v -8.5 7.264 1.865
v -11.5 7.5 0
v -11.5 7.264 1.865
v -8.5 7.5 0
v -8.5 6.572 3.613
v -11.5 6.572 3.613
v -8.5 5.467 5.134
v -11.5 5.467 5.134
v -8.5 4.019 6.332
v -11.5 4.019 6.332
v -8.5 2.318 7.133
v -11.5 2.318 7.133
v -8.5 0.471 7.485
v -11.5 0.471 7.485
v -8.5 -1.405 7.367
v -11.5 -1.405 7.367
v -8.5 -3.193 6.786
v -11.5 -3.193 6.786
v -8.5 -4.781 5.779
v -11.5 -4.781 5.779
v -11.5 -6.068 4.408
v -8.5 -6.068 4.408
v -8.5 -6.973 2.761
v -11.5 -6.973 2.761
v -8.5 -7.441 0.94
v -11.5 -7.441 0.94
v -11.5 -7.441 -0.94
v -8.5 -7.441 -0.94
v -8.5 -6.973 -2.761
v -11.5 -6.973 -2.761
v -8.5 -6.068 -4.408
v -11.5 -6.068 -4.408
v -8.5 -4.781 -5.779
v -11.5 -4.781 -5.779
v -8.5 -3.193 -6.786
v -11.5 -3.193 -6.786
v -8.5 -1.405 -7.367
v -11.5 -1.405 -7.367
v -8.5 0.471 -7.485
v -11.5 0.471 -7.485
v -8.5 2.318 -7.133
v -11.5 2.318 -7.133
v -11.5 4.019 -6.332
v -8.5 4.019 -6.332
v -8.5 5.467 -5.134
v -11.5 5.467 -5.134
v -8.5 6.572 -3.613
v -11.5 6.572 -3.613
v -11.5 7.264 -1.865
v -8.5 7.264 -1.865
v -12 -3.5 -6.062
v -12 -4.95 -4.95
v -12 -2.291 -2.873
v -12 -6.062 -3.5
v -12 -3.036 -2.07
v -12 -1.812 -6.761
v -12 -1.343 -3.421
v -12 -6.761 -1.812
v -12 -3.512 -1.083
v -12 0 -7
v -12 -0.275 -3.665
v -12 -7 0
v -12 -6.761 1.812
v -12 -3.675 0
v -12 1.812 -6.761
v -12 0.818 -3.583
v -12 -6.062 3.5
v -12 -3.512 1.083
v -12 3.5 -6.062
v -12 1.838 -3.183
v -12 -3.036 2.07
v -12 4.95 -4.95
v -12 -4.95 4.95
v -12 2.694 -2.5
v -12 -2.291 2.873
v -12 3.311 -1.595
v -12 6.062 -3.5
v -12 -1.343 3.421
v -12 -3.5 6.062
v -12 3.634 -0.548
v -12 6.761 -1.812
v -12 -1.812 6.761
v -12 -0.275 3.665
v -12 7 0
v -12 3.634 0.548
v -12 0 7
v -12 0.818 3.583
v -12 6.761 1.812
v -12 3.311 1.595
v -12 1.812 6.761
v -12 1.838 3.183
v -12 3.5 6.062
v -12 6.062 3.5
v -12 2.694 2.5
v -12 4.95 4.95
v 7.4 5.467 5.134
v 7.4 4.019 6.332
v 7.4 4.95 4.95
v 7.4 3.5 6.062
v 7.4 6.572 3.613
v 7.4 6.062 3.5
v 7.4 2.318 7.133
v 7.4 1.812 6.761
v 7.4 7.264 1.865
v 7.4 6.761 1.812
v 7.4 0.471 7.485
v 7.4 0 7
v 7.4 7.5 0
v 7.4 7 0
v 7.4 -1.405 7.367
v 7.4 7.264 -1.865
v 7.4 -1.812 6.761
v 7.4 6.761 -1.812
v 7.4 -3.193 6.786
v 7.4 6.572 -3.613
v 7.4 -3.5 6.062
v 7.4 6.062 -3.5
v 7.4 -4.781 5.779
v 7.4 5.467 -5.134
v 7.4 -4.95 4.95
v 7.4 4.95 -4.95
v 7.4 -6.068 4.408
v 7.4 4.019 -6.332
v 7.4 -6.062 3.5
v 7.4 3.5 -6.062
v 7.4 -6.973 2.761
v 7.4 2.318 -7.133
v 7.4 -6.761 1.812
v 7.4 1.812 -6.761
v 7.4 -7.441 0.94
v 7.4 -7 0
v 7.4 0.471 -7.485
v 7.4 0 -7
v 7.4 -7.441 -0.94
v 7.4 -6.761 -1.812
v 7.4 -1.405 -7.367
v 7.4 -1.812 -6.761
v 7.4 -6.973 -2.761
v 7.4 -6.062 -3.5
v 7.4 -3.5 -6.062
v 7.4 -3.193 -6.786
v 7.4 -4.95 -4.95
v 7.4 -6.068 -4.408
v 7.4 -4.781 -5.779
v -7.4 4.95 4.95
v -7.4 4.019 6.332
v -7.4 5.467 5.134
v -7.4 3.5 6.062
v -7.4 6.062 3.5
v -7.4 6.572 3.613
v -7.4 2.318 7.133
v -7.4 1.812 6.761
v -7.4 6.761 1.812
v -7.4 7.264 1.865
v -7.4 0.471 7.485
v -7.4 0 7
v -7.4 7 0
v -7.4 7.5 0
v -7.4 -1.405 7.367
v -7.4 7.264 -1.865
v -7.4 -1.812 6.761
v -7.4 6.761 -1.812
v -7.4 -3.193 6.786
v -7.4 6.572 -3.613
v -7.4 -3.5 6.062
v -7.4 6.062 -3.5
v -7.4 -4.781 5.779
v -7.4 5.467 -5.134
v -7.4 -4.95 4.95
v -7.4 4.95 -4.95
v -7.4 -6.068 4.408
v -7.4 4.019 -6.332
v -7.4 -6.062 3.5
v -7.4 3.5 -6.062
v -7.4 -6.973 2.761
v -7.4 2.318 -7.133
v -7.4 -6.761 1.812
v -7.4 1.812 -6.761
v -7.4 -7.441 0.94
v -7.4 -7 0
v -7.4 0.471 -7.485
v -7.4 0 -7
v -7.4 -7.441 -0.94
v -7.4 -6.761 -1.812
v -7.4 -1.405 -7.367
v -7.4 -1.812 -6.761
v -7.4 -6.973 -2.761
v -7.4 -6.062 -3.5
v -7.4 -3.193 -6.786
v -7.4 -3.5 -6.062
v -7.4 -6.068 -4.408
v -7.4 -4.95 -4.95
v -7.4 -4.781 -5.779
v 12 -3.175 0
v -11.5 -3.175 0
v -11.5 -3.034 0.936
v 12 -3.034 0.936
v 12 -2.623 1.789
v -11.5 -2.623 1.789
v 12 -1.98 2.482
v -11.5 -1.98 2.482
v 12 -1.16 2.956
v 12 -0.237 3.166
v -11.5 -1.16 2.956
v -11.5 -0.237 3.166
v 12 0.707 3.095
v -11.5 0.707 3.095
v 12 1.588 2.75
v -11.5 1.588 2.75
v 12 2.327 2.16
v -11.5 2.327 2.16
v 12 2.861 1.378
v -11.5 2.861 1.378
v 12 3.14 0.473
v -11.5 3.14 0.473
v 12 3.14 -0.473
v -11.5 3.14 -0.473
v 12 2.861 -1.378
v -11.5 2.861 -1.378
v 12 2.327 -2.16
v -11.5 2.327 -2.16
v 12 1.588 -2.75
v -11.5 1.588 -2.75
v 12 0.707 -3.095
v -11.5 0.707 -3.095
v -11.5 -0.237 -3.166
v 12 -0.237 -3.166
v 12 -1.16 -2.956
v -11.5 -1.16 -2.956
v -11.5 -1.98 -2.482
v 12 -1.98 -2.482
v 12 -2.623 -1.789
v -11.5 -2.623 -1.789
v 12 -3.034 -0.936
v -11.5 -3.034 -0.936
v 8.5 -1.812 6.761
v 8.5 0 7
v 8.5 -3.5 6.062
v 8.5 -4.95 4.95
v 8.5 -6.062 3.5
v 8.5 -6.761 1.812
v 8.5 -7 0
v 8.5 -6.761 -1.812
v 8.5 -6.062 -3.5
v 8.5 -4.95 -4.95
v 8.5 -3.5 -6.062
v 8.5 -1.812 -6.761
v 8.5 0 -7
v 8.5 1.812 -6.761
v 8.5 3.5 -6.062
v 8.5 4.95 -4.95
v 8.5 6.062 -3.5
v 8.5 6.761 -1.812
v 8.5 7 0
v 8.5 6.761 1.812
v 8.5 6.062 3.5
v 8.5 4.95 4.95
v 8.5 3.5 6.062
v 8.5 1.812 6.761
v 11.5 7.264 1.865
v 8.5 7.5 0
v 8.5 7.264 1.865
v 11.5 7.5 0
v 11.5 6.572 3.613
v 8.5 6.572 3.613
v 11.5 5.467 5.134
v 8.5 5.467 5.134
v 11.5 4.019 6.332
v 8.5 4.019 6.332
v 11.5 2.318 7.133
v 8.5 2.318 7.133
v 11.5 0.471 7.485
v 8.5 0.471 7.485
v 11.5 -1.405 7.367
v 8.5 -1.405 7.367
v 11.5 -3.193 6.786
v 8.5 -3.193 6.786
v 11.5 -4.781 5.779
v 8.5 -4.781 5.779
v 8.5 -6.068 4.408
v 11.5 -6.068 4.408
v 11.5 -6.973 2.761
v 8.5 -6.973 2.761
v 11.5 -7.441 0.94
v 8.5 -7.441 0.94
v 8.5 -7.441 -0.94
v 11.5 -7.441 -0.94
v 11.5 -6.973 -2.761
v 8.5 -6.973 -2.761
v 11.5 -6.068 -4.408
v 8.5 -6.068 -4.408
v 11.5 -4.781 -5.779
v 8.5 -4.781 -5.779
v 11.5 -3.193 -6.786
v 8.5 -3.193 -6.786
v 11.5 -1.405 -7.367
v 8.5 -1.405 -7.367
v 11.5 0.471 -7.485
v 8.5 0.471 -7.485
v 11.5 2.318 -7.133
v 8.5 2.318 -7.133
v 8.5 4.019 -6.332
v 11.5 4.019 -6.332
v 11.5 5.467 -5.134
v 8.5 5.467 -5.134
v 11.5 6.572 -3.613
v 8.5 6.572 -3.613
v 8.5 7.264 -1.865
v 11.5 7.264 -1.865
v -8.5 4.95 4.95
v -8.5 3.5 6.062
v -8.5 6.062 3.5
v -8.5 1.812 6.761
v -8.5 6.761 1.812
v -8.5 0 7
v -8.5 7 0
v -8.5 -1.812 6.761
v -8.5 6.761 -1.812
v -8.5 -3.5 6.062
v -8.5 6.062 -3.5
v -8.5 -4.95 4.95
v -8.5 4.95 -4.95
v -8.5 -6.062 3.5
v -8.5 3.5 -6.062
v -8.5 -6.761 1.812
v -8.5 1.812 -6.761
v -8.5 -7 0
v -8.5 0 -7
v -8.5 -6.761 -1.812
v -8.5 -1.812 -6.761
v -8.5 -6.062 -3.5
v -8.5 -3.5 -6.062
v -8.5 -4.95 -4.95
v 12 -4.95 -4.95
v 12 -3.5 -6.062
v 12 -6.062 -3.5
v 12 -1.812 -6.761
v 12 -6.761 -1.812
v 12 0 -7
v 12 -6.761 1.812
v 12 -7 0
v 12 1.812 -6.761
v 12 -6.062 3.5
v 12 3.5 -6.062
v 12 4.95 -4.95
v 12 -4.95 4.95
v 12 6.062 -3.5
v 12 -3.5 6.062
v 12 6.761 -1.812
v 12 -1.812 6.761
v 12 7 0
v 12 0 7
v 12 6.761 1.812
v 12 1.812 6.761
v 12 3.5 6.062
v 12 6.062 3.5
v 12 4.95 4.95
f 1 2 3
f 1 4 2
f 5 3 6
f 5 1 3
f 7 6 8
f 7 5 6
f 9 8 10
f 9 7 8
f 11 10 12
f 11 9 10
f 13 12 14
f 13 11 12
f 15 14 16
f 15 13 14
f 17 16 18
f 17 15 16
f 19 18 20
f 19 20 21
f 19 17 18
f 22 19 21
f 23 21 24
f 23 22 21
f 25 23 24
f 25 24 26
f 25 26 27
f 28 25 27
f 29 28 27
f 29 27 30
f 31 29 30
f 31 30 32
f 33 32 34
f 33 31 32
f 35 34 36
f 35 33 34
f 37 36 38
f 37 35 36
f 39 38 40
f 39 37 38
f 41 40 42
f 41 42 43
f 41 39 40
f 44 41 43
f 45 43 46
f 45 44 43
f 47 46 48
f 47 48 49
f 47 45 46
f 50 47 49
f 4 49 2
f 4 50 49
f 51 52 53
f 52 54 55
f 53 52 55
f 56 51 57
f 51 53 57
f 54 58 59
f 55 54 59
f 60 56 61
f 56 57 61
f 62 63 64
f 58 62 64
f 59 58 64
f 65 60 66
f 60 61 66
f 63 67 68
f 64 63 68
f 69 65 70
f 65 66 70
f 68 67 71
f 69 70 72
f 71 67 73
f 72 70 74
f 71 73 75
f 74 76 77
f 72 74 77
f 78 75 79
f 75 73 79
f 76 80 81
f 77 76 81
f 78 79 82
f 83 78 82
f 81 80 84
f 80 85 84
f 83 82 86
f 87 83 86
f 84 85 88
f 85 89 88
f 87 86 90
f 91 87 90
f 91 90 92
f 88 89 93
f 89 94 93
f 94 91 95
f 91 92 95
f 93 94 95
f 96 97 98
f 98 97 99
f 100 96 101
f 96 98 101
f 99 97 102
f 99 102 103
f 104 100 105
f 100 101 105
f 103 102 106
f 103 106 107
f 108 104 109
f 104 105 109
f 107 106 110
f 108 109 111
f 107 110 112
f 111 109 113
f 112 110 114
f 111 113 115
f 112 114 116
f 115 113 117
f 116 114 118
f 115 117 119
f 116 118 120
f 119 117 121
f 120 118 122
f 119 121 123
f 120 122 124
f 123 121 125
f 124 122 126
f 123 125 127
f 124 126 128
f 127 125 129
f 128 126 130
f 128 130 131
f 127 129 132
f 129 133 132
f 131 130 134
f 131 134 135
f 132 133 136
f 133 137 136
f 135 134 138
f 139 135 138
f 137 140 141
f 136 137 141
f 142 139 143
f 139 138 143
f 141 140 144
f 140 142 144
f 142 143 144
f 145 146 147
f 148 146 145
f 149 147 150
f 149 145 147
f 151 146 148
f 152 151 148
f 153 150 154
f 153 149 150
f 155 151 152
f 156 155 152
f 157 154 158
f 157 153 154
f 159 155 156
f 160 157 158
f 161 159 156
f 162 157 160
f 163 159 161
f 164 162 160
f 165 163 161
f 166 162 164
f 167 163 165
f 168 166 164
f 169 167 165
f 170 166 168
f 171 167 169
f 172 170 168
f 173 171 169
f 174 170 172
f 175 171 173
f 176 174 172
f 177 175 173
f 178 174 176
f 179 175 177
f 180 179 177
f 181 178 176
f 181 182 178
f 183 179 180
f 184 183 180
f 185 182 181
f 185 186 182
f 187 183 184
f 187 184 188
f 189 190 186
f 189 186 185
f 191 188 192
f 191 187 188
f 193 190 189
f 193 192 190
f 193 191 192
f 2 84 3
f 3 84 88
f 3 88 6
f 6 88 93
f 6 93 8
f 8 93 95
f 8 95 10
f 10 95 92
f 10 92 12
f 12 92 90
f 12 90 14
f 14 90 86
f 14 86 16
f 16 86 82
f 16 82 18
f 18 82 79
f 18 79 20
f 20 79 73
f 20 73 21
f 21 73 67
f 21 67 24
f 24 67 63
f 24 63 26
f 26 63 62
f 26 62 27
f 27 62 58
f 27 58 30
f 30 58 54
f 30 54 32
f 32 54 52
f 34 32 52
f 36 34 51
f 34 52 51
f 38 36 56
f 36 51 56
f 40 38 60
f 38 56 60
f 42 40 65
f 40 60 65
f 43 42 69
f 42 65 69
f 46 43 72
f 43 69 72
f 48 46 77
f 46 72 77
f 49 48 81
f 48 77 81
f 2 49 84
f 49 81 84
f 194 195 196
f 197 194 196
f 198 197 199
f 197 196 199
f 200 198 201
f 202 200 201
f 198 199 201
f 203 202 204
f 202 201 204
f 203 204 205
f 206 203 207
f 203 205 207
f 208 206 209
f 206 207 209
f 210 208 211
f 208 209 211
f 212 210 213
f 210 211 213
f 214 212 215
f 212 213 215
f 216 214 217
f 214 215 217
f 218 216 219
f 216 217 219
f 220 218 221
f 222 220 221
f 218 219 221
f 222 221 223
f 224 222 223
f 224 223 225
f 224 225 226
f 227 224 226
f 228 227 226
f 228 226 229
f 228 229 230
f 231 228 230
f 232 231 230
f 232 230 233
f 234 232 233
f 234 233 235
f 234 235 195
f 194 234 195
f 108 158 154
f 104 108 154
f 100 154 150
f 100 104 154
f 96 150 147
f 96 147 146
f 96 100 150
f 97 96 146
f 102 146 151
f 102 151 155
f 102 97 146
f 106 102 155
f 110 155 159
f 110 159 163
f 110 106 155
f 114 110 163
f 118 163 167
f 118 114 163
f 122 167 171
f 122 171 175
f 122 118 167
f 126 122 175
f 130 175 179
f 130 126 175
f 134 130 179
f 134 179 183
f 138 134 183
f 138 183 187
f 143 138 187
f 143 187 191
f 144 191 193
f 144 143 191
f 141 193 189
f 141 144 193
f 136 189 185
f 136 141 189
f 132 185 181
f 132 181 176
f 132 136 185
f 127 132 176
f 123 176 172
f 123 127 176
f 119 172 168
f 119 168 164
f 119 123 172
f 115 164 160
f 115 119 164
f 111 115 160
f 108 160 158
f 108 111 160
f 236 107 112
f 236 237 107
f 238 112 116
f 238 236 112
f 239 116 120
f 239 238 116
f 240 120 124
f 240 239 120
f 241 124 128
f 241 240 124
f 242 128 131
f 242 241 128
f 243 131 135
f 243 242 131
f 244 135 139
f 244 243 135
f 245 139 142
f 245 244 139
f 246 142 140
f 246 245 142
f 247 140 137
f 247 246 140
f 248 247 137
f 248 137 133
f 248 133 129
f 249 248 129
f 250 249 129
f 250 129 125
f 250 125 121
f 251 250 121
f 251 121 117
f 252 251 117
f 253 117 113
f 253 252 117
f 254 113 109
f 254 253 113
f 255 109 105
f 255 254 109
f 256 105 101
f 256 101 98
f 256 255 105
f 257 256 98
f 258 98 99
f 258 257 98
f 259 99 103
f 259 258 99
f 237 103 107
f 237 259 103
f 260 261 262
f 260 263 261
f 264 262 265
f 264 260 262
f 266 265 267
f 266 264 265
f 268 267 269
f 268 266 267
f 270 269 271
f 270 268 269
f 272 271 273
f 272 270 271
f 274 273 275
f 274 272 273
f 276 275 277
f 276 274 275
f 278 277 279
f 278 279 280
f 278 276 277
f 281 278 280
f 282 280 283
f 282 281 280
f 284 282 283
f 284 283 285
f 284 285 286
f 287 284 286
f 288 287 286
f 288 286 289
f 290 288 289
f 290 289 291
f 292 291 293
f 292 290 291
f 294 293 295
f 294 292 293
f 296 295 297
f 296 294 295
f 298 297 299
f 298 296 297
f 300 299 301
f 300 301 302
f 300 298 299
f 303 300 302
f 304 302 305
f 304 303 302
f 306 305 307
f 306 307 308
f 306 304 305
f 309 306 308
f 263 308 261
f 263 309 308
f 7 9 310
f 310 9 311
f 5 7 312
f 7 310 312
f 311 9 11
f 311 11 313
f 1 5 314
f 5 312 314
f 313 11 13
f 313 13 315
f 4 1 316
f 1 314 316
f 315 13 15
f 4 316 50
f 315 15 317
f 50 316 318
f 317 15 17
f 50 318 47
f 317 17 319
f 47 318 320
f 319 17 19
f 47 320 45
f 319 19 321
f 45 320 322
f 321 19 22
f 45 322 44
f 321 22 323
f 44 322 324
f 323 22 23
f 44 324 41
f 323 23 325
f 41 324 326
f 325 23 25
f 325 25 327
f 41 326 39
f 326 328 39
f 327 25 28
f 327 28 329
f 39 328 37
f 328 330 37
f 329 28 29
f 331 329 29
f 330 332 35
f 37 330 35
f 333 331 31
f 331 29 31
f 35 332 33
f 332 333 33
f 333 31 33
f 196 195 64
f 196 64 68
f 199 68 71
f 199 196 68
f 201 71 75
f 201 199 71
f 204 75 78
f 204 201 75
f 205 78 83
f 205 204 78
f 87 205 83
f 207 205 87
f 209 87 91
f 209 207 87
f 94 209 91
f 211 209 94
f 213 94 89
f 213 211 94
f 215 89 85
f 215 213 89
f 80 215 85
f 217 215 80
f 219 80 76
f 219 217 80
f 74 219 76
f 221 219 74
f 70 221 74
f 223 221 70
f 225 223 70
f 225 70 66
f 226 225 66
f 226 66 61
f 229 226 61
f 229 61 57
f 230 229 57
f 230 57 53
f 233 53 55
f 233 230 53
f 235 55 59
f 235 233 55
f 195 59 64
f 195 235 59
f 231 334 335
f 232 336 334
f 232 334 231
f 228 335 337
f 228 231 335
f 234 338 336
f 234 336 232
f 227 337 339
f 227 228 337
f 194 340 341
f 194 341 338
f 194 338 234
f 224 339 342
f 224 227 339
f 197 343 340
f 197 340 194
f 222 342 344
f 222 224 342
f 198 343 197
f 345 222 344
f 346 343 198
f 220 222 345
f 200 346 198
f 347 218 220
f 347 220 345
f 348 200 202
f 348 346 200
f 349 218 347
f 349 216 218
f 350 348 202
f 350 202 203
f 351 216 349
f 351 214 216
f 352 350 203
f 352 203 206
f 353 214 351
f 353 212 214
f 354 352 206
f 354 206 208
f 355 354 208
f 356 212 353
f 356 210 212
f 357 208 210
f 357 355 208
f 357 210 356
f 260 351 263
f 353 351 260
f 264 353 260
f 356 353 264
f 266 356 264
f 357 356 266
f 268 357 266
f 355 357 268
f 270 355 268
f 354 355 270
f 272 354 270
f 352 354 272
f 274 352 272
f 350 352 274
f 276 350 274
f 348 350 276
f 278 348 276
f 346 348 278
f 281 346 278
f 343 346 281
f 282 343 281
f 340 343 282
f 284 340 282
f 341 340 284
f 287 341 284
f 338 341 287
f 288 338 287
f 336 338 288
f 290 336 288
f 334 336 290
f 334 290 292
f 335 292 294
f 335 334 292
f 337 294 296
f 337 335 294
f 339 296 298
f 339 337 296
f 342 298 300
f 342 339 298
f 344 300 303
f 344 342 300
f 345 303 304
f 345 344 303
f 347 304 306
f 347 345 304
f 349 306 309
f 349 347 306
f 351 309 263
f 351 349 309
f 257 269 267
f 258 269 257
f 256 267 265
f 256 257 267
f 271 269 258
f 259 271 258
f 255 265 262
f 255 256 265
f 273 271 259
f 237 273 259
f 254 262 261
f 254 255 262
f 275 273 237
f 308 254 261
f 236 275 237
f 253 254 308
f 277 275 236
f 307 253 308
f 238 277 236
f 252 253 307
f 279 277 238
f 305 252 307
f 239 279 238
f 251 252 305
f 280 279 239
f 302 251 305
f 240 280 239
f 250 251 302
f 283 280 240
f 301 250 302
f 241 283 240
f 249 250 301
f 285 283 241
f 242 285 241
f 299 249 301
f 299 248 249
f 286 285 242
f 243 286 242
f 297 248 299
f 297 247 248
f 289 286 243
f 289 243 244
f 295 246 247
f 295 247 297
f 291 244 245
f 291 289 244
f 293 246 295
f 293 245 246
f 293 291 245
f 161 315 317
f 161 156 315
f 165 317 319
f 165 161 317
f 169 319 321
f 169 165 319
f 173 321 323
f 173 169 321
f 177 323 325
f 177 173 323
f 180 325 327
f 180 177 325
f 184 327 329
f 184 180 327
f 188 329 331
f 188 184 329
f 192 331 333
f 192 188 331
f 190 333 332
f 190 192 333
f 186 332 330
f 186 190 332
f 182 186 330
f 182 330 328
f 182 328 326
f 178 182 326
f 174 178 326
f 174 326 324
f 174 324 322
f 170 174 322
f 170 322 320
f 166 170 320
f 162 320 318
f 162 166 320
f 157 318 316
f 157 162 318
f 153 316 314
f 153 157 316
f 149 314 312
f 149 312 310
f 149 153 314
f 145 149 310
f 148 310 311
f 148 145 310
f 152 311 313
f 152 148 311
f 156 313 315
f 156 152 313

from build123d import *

# Parameters (mm, degrees)
F0_R     = 7.5
F1_DEPTH = 12
F3_D     = 6.35
F4_SIZE  = 0.5
F5_W     = 1.1
F5_H     = 3.9801998064


with BuildPart() as f1:
    # F0 (on Right) → F1 (new body, symmetric)
    with BuildSketch(Plane.YZ):
        Circle(F0_R)
    extrude(amount=F1_DEPTH, both=True)

    # F3 (through all)
    with Locations(Plane.YZ.offset(12)):
        with Locations((0, 0)):
            Hole(F3_D / 2)

    # F4
    f4_edges = [f1.edges().sort_by_distance(p)[0] for p in [
        (12, -7.5, 0),
        (-12, -7.5, 0),
        (-12, -3.175, 0),
    ]]
    chamfer(f4_edges, length=F4_SIZE)

    # F5 (on Front) → F6 (revolve, cut)
    with BuildSketch(Plane.XZ):
        with Locations((-7.95, 8.9900999032)):
            Rectangle(F5_W, F5_H)
        with Locations((7.95, 8.9900999032)):
            Rectangle(F5_W, F5_H)
    revolve(axis=Axis((-0.5466132425, 0, 0), (1, 0, 0)), mode=Mode.SUBTRACT)


solid = f1.part
